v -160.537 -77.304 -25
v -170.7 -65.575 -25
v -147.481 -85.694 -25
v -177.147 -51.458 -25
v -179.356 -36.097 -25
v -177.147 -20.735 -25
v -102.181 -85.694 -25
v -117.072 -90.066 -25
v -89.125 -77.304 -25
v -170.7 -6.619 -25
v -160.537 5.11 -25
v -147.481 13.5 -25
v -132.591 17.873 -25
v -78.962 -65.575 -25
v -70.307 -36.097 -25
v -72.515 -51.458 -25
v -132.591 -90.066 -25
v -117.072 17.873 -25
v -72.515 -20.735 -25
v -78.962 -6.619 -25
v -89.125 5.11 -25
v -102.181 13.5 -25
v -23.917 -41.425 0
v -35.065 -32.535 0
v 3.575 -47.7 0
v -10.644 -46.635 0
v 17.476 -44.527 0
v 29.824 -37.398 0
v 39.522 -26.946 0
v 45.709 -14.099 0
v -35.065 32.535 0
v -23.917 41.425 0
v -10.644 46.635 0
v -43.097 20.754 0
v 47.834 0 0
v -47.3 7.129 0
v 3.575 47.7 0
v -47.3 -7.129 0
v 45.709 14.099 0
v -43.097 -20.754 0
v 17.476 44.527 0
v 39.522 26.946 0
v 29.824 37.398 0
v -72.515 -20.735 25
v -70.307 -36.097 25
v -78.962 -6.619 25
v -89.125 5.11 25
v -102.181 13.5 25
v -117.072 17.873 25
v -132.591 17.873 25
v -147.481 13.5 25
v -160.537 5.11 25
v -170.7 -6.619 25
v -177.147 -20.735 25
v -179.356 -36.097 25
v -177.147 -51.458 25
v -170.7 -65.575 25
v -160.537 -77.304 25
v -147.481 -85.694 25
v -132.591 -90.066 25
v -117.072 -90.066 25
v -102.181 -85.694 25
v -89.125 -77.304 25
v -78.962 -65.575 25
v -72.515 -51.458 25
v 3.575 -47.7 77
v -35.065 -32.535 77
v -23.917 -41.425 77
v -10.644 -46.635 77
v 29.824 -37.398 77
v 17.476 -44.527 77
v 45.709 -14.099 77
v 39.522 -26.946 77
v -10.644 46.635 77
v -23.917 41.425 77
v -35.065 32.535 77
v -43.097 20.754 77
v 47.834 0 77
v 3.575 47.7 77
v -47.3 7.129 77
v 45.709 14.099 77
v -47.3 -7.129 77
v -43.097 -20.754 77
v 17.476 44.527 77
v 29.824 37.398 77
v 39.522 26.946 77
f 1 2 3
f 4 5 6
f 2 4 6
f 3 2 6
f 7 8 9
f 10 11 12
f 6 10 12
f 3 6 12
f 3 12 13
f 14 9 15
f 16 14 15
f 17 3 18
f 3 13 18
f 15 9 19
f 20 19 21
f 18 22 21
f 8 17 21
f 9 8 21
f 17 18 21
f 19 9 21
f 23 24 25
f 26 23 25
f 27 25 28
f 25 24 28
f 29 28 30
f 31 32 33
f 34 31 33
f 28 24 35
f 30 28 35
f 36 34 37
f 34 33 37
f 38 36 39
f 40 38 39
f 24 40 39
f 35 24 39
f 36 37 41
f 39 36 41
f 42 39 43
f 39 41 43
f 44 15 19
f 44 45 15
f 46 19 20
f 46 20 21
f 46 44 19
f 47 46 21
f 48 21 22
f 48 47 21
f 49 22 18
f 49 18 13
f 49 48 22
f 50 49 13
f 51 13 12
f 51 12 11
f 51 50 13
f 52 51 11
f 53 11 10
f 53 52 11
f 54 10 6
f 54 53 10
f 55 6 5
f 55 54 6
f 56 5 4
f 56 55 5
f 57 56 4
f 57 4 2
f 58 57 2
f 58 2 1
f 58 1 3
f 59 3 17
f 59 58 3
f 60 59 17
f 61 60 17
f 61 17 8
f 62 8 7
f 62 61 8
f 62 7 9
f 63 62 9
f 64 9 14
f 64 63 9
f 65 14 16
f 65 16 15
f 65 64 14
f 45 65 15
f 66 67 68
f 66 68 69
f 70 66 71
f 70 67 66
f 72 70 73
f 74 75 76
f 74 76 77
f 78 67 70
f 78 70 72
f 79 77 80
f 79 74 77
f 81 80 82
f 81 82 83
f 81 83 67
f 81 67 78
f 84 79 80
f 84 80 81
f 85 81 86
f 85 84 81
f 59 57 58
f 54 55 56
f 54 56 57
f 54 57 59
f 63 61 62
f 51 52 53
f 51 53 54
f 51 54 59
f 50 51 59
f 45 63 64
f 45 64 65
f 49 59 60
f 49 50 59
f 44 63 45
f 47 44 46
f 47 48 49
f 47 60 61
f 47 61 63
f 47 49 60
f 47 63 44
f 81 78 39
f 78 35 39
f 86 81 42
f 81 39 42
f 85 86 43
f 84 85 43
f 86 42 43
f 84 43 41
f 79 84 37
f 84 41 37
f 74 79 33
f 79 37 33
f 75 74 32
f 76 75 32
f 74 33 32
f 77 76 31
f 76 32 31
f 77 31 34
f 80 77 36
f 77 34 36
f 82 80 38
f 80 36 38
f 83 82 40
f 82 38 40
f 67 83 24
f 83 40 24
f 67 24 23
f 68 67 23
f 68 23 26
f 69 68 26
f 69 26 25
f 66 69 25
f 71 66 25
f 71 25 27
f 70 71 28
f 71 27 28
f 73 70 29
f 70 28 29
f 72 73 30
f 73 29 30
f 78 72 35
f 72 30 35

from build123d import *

# Parameters (mm, degrees)
F0_R     = 47.8338670268
F1_DEPTH = 25
F2_R     = 54.5244739927
F3_DEPTH = 25
F4_DEPTH = 25
F5_DEPTH = 25
F6_DEPTH = 52


with BuildPart() as f1:
    # F0 (on Top) → F1 (new body)
    with BuildSketch(Plane.XY):
        Circle(F0_R)
    extrude(amount=F1_DEPTH)

    # F6 (add): a face of the model
    f6_faces = [f1.faces().sort_by_distance(p)[0] for p in [
        (0, 0, 25),
    ]]
    extrude(f6_faces, amount=F6_DEPTH)


with BuildPart() as f3:
    # F2 (on Top) → F3 (new body)
    with BuildSketch(Plane.XY):
        with Locations((-124.831199646, -36.0967591405)):
            Circle(F2_R)
    extrude(amount=F3_DEPTH)

    # F4 (add): a face of the model
    f4_faces = [f3.faces().sort_by_distance(p)[0] for p in [
        (-124.831199646, -36.0967591405, 25),
    ]]
    extrude(f4_faces, amount=-F4_DEPTH)

    # F5 (add): faces of the model
    f5_faces = [f3.faces().sort_by_distance(p)[0] for p in [
        (-124.831199646, -36.0967591405, 0),
        (-124.831199646, -36.0967591405, 25),
    ]]
    extrude(f5_faces, amount=F5_DEPTH, dir=(0, 0, -1))


solid = Compound([f1.part, f3.part])
